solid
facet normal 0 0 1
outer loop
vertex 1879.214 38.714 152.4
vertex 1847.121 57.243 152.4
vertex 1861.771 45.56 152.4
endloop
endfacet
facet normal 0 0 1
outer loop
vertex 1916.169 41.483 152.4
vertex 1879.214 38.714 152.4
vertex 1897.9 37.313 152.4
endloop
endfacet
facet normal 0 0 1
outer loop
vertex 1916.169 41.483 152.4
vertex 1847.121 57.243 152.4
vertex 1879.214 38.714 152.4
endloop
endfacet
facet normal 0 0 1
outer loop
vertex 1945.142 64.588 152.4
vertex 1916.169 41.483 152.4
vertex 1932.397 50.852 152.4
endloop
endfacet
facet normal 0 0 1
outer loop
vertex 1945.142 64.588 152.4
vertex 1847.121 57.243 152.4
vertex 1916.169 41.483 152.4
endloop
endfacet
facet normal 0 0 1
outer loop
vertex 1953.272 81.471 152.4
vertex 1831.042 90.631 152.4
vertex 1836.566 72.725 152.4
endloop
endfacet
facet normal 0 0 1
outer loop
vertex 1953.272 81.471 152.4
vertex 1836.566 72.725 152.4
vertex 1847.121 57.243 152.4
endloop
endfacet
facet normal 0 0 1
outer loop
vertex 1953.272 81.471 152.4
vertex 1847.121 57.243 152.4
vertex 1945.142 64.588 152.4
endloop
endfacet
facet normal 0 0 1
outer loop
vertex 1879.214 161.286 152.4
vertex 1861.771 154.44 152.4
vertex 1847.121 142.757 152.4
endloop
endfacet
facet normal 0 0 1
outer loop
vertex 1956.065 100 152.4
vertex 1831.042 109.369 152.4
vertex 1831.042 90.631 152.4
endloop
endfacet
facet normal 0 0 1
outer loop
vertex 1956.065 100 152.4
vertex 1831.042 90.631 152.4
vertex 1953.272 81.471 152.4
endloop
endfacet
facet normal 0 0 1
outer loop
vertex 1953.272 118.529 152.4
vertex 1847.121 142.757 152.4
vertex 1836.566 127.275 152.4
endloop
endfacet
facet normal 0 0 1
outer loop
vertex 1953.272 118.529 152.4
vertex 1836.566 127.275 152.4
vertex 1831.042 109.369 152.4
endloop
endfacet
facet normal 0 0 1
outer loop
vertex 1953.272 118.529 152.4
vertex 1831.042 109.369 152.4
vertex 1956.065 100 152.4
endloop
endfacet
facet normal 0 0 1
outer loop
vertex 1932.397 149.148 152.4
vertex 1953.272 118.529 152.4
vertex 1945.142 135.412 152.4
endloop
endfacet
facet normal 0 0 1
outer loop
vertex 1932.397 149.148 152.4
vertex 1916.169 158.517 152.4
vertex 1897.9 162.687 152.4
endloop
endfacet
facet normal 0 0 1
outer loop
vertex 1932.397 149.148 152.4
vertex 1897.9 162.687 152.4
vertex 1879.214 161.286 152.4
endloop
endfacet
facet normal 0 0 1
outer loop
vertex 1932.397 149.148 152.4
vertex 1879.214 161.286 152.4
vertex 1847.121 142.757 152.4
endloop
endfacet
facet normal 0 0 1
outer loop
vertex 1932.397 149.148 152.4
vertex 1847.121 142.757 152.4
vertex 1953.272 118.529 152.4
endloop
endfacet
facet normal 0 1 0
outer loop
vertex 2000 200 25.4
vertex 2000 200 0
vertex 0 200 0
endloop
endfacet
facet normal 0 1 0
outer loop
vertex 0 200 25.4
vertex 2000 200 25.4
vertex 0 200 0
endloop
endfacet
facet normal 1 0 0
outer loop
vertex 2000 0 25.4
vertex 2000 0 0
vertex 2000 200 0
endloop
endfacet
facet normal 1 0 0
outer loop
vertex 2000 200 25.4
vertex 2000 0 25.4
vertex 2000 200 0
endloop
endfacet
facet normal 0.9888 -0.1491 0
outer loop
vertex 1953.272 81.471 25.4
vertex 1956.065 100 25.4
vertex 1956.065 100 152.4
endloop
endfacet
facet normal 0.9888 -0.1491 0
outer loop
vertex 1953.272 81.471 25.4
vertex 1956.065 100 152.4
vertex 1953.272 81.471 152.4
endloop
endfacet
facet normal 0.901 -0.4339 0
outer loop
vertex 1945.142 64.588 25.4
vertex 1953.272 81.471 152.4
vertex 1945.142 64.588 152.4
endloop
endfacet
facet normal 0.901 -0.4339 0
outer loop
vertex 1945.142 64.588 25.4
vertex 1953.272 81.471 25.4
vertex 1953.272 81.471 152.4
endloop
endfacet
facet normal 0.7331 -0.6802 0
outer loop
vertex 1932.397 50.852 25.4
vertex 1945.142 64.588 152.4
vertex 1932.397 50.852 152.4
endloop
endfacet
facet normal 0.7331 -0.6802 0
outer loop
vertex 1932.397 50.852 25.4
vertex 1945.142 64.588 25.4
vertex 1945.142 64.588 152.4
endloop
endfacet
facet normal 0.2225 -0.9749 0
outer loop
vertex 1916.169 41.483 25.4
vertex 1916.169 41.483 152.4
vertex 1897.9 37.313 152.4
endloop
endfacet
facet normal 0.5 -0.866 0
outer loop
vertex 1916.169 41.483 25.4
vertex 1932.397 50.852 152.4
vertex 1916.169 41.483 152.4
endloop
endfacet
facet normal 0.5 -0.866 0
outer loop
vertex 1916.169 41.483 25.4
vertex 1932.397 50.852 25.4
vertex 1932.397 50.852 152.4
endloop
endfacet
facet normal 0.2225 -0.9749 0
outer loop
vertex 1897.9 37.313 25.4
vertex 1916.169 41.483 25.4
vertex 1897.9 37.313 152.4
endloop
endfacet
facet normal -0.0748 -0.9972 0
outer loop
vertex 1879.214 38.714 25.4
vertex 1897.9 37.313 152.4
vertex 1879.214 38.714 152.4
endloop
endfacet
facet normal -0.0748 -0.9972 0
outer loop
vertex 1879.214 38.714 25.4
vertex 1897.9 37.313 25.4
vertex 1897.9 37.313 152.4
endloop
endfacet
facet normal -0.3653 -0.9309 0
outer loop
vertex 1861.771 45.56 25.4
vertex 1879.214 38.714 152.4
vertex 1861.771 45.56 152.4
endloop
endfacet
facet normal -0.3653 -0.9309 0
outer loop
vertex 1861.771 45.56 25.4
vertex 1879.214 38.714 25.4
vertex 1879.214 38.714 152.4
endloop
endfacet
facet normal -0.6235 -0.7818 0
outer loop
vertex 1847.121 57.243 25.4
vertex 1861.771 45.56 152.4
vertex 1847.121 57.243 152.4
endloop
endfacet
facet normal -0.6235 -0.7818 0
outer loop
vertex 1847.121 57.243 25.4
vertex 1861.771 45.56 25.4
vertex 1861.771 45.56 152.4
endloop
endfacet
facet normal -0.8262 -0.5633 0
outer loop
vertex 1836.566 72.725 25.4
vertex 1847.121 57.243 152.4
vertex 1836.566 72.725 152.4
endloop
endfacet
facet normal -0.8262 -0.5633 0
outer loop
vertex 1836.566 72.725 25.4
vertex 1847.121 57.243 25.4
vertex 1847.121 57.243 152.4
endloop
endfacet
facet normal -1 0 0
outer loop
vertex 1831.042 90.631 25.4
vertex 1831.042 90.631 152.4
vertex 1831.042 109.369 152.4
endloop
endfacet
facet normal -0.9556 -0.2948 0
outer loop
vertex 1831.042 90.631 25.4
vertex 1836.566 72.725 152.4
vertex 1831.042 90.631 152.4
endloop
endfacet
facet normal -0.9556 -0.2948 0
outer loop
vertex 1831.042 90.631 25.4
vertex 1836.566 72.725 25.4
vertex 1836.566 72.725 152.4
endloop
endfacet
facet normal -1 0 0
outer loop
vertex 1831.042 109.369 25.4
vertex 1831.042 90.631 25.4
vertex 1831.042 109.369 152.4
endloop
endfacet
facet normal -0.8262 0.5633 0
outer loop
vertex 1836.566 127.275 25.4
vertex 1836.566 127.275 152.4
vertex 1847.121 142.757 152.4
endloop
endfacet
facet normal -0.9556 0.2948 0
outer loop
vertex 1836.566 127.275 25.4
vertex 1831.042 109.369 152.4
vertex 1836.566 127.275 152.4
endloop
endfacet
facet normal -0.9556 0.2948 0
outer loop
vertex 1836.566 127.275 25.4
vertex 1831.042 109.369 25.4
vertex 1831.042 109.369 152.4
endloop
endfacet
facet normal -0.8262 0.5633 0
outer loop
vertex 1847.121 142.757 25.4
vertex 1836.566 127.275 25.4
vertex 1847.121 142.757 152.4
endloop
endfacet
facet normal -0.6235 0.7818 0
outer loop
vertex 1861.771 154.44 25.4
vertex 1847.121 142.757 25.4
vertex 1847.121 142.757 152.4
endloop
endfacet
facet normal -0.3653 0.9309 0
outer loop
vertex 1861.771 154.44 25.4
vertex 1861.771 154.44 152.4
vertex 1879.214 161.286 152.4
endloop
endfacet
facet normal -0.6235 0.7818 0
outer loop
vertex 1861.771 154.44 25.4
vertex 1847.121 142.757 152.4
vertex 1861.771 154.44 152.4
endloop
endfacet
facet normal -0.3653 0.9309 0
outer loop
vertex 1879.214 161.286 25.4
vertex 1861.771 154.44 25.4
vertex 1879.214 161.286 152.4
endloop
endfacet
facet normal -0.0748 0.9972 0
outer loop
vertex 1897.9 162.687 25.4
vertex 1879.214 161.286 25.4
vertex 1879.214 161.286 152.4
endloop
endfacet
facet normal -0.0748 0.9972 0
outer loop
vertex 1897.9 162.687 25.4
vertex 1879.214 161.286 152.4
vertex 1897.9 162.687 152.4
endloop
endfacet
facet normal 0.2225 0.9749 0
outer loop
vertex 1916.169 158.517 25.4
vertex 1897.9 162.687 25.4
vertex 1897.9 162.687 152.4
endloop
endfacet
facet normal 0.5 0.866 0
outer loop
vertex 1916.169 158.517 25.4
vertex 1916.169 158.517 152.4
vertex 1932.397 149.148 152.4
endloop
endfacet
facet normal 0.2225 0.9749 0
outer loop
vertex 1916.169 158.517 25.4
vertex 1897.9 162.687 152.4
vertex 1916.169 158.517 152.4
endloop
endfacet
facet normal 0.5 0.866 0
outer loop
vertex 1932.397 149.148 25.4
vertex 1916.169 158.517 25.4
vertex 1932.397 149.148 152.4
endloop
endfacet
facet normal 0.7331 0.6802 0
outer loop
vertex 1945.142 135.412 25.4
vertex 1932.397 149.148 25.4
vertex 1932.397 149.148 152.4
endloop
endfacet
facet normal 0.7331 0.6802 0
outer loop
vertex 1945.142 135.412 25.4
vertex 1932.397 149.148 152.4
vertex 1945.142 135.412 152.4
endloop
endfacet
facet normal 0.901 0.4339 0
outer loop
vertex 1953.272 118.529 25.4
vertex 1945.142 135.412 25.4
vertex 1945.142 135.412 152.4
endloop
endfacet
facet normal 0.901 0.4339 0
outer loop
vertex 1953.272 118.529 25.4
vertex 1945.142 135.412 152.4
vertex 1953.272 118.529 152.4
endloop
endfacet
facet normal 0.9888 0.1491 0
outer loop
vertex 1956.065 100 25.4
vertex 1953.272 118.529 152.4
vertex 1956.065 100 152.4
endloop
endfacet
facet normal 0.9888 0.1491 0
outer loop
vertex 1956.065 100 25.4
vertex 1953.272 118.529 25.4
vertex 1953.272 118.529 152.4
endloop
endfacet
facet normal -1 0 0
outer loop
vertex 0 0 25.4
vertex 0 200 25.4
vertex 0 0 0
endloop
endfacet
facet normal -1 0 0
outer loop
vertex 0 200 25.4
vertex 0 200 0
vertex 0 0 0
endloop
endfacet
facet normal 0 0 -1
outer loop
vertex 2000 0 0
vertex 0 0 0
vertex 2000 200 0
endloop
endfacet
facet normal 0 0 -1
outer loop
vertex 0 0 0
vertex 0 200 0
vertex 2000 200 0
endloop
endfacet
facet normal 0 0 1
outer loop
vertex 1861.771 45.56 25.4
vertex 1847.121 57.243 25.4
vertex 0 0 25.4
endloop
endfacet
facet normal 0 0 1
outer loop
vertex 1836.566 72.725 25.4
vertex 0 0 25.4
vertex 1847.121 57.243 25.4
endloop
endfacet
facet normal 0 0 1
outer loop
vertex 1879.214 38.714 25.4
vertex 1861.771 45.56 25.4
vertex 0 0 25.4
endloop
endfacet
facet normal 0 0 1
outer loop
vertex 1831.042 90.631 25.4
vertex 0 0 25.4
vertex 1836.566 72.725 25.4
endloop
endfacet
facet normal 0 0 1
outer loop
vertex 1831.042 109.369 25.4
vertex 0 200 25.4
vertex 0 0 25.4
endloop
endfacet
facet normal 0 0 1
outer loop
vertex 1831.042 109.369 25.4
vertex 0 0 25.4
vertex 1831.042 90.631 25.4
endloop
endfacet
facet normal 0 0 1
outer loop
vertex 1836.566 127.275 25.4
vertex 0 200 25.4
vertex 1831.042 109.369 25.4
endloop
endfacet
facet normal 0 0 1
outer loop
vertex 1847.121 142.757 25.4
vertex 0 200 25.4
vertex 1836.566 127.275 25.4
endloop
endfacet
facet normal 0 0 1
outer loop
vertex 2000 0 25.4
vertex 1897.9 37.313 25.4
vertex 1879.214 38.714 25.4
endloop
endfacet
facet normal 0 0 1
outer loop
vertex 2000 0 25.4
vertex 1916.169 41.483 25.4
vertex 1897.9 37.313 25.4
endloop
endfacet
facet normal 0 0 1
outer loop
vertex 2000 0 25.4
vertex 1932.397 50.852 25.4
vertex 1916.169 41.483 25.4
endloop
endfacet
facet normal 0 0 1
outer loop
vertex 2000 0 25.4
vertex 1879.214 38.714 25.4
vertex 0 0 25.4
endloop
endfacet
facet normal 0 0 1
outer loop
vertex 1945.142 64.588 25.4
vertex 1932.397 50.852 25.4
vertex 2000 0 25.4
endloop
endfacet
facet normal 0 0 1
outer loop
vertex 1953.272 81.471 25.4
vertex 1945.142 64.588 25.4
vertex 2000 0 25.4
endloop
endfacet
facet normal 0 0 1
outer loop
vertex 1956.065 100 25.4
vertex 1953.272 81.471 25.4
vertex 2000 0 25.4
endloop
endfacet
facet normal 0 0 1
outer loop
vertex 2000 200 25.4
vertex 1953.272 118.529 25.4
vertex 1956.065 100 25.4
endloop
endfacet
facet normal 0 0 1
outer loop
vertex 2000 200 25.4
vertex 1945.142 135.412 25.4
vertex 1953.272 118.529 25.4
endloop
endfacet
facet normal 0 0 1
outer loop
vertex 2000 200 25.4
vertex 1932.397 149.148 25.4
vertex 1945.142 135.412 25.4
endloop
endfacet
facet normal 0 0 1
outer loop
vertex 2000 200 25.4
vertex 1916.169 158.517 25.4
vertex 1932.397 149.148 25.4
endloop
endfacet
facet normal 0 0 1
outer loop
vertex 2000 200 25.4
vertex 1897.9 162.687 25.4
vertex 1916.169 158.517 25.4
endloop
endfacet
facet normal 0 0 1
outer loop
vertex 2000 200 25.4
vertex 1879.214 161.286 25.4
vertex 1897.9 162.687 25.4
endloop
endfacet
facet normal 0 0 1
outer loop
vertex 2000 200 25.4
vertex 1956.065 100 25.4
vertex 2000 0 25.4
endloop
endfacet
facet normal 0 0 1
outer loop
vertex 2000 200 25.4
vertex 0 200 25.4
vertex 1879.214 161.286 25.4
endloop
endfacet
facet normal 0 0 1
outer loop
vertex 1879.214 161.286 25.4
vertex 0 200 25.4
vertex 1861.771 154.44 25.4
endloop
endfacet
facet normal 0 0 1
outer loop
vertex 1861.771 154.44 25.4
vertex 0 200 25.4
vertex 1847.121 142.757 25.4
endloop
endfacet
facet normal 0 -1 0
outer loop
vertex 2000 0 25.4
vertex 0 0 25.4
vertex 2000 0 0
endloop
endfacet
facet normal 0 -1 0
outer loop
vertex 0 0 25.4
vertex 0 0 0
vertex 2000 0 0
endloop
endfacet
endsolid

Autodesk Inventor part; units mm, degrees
ref_plane "YZ Plane" through (0, 0, 0) normal (1, 0, 0) x (0, 1, 0)
ref_plane "XZ Plane" through (0, 0, 0) normal (0, 1, 0) x (-1, 0, 0)
ref_plane "XY Plane" through (0, 0, 0) normal (0, 0, 1) x (1, 0, 0)
sketch "Sketch1" plane through (0, 0, 0) normal (0, 0, 1) x (1, 0, 0)
  line L0 (0, 0) -> (2000, 0)
  line L1 (2000, 0) -> (2000, 200)
  line L2 (2000, 200) -> (0, 200)
  line L3 (0, 200) -> (0, 0)
  dimension "d0" = 2000
  dimension "d1" = 200
extrude "Extrusion1" add sketch "Sketch1" along normal blind 25.4
sketch "Sketch2" plane through (0, 0, 25.4) normal (0, 0, 1) x (1, 0, 0)
  circle A0 centre (1893.2025, 100) radius 62.8623
  point P0 (0, 0)
  dimension "d4" = 125.7246
  dimension "d5" = 1895.8417
extrude "Extrusion2" add sketch "Sketch2" along normal blind 127
properties part number "Belt"
